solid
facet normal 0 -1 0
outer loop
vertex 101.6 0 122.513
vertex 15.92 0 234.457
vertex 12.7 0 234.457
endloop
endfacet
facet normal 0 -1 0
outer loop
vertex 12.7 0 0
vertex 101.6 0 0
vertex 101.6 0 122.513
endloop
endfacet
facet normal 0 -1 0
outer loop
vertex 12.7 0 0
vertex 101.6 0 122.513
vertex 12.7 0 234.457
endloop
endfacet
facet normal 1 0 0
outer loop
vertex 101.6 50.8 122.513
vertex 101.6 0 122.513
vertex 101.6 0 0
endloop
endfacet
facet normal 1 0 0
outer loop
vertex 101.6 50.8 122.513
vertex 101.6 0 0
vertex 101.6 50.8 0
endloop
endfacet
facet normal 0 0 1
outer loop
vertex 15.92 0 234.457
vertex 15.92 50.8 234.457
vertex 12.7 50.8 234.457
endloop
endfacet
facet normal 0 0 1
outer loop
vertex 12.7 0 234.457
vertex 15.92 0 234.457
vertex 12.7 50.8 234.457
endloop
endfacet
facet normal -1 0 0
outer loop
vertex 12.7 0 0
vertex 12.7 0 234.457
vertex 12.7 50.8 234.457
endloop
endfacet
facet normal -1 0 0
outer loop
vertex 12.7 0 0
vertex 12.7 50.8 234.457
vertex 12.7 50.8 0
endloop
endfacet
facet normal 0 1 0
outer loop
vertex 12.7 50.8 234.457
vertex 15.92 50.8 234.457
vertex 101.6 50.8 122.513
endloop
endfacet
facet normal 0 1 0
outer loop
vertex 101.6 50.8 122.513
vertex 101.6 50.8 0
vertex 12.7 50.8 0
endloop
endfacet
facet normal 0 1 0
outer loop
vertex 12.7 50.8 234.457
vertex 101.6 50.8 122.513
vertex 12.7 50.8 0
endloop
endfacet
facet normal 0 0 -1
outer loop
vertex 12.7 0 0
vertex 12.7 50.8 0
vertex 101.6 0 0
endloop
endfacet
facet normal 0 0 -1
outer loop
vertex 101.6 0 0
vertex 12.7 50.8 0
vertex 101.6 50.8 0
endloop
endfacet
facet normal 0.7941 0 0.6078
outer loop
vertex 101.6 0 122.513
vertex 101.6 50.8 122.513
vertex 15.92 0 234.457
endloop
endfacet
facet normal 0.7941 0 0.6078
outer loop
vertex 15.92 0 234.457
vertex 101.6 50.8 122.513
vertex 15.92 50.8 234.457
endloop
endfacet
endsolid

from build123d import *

# Parameters (mm, degrees)
SKETCH2_W               = 101.6
SKETCH2_H               = 50.8
BOSS_EXTRUDE1_DEPTH     = 122.512802726
BOSS_EXTRUDE2_DEPTH     = 50.8
CUT_EXTRUDE1_DEPTH      = 261.524644331
CUT_EXTRUDE1_DEPTH_BACK = 261.524644331
SKETCH4_W               = 12.7
SKETCH4_H               = 234.456585115


with BuildPart() as part:
    # Sketch2 → Boss-Extrude1 (new body)
    with BuildSketch(Plane.XY):
        with Locations((50.8, 25.4)):
            Rectangle(SKETCH2_W, SKETCH2_H)
    extrude(amount=BOSS_EXTRUDE1_DEPTH)

    # Sketch3 → Boss-Extrude2 (add)
    with BuildSketch(Plane(origin=(0, 50.8, 0), x_dir=(1, 0, 0), z_dir=(0, 1, 0))):
        Polygon((101.6, -122.512802726), (15.9196024, -234.456585115), (0, -234.456585115), (0, -122.512802726), align=None)
    extrude(amount=-BOSS_EXTRUDE2_DEPTH)

    # Sketch4 → Cut-Extrude1 (cut, two sides: drawn at the far end of the back side and taken through both)
    with BuildSketch(Plane(origin=(0, 50.8, 0), x_dir=(1, 0, 0), z_dir=(0, 1, 0)).offset(-CUT_EXTRUDE1_DEPTH_BACK)):
        with Locations((6.35, -117.228292558)):
            Rectangle(SKETCH4_W, SKETCH4_H)
    extrude(amount=CUT_EXTRUDE1_DEPTH + CUT_EXTRUDE1_DEPTH_BACK, mode=Mode.SUBTRACT)


solid = part.part
